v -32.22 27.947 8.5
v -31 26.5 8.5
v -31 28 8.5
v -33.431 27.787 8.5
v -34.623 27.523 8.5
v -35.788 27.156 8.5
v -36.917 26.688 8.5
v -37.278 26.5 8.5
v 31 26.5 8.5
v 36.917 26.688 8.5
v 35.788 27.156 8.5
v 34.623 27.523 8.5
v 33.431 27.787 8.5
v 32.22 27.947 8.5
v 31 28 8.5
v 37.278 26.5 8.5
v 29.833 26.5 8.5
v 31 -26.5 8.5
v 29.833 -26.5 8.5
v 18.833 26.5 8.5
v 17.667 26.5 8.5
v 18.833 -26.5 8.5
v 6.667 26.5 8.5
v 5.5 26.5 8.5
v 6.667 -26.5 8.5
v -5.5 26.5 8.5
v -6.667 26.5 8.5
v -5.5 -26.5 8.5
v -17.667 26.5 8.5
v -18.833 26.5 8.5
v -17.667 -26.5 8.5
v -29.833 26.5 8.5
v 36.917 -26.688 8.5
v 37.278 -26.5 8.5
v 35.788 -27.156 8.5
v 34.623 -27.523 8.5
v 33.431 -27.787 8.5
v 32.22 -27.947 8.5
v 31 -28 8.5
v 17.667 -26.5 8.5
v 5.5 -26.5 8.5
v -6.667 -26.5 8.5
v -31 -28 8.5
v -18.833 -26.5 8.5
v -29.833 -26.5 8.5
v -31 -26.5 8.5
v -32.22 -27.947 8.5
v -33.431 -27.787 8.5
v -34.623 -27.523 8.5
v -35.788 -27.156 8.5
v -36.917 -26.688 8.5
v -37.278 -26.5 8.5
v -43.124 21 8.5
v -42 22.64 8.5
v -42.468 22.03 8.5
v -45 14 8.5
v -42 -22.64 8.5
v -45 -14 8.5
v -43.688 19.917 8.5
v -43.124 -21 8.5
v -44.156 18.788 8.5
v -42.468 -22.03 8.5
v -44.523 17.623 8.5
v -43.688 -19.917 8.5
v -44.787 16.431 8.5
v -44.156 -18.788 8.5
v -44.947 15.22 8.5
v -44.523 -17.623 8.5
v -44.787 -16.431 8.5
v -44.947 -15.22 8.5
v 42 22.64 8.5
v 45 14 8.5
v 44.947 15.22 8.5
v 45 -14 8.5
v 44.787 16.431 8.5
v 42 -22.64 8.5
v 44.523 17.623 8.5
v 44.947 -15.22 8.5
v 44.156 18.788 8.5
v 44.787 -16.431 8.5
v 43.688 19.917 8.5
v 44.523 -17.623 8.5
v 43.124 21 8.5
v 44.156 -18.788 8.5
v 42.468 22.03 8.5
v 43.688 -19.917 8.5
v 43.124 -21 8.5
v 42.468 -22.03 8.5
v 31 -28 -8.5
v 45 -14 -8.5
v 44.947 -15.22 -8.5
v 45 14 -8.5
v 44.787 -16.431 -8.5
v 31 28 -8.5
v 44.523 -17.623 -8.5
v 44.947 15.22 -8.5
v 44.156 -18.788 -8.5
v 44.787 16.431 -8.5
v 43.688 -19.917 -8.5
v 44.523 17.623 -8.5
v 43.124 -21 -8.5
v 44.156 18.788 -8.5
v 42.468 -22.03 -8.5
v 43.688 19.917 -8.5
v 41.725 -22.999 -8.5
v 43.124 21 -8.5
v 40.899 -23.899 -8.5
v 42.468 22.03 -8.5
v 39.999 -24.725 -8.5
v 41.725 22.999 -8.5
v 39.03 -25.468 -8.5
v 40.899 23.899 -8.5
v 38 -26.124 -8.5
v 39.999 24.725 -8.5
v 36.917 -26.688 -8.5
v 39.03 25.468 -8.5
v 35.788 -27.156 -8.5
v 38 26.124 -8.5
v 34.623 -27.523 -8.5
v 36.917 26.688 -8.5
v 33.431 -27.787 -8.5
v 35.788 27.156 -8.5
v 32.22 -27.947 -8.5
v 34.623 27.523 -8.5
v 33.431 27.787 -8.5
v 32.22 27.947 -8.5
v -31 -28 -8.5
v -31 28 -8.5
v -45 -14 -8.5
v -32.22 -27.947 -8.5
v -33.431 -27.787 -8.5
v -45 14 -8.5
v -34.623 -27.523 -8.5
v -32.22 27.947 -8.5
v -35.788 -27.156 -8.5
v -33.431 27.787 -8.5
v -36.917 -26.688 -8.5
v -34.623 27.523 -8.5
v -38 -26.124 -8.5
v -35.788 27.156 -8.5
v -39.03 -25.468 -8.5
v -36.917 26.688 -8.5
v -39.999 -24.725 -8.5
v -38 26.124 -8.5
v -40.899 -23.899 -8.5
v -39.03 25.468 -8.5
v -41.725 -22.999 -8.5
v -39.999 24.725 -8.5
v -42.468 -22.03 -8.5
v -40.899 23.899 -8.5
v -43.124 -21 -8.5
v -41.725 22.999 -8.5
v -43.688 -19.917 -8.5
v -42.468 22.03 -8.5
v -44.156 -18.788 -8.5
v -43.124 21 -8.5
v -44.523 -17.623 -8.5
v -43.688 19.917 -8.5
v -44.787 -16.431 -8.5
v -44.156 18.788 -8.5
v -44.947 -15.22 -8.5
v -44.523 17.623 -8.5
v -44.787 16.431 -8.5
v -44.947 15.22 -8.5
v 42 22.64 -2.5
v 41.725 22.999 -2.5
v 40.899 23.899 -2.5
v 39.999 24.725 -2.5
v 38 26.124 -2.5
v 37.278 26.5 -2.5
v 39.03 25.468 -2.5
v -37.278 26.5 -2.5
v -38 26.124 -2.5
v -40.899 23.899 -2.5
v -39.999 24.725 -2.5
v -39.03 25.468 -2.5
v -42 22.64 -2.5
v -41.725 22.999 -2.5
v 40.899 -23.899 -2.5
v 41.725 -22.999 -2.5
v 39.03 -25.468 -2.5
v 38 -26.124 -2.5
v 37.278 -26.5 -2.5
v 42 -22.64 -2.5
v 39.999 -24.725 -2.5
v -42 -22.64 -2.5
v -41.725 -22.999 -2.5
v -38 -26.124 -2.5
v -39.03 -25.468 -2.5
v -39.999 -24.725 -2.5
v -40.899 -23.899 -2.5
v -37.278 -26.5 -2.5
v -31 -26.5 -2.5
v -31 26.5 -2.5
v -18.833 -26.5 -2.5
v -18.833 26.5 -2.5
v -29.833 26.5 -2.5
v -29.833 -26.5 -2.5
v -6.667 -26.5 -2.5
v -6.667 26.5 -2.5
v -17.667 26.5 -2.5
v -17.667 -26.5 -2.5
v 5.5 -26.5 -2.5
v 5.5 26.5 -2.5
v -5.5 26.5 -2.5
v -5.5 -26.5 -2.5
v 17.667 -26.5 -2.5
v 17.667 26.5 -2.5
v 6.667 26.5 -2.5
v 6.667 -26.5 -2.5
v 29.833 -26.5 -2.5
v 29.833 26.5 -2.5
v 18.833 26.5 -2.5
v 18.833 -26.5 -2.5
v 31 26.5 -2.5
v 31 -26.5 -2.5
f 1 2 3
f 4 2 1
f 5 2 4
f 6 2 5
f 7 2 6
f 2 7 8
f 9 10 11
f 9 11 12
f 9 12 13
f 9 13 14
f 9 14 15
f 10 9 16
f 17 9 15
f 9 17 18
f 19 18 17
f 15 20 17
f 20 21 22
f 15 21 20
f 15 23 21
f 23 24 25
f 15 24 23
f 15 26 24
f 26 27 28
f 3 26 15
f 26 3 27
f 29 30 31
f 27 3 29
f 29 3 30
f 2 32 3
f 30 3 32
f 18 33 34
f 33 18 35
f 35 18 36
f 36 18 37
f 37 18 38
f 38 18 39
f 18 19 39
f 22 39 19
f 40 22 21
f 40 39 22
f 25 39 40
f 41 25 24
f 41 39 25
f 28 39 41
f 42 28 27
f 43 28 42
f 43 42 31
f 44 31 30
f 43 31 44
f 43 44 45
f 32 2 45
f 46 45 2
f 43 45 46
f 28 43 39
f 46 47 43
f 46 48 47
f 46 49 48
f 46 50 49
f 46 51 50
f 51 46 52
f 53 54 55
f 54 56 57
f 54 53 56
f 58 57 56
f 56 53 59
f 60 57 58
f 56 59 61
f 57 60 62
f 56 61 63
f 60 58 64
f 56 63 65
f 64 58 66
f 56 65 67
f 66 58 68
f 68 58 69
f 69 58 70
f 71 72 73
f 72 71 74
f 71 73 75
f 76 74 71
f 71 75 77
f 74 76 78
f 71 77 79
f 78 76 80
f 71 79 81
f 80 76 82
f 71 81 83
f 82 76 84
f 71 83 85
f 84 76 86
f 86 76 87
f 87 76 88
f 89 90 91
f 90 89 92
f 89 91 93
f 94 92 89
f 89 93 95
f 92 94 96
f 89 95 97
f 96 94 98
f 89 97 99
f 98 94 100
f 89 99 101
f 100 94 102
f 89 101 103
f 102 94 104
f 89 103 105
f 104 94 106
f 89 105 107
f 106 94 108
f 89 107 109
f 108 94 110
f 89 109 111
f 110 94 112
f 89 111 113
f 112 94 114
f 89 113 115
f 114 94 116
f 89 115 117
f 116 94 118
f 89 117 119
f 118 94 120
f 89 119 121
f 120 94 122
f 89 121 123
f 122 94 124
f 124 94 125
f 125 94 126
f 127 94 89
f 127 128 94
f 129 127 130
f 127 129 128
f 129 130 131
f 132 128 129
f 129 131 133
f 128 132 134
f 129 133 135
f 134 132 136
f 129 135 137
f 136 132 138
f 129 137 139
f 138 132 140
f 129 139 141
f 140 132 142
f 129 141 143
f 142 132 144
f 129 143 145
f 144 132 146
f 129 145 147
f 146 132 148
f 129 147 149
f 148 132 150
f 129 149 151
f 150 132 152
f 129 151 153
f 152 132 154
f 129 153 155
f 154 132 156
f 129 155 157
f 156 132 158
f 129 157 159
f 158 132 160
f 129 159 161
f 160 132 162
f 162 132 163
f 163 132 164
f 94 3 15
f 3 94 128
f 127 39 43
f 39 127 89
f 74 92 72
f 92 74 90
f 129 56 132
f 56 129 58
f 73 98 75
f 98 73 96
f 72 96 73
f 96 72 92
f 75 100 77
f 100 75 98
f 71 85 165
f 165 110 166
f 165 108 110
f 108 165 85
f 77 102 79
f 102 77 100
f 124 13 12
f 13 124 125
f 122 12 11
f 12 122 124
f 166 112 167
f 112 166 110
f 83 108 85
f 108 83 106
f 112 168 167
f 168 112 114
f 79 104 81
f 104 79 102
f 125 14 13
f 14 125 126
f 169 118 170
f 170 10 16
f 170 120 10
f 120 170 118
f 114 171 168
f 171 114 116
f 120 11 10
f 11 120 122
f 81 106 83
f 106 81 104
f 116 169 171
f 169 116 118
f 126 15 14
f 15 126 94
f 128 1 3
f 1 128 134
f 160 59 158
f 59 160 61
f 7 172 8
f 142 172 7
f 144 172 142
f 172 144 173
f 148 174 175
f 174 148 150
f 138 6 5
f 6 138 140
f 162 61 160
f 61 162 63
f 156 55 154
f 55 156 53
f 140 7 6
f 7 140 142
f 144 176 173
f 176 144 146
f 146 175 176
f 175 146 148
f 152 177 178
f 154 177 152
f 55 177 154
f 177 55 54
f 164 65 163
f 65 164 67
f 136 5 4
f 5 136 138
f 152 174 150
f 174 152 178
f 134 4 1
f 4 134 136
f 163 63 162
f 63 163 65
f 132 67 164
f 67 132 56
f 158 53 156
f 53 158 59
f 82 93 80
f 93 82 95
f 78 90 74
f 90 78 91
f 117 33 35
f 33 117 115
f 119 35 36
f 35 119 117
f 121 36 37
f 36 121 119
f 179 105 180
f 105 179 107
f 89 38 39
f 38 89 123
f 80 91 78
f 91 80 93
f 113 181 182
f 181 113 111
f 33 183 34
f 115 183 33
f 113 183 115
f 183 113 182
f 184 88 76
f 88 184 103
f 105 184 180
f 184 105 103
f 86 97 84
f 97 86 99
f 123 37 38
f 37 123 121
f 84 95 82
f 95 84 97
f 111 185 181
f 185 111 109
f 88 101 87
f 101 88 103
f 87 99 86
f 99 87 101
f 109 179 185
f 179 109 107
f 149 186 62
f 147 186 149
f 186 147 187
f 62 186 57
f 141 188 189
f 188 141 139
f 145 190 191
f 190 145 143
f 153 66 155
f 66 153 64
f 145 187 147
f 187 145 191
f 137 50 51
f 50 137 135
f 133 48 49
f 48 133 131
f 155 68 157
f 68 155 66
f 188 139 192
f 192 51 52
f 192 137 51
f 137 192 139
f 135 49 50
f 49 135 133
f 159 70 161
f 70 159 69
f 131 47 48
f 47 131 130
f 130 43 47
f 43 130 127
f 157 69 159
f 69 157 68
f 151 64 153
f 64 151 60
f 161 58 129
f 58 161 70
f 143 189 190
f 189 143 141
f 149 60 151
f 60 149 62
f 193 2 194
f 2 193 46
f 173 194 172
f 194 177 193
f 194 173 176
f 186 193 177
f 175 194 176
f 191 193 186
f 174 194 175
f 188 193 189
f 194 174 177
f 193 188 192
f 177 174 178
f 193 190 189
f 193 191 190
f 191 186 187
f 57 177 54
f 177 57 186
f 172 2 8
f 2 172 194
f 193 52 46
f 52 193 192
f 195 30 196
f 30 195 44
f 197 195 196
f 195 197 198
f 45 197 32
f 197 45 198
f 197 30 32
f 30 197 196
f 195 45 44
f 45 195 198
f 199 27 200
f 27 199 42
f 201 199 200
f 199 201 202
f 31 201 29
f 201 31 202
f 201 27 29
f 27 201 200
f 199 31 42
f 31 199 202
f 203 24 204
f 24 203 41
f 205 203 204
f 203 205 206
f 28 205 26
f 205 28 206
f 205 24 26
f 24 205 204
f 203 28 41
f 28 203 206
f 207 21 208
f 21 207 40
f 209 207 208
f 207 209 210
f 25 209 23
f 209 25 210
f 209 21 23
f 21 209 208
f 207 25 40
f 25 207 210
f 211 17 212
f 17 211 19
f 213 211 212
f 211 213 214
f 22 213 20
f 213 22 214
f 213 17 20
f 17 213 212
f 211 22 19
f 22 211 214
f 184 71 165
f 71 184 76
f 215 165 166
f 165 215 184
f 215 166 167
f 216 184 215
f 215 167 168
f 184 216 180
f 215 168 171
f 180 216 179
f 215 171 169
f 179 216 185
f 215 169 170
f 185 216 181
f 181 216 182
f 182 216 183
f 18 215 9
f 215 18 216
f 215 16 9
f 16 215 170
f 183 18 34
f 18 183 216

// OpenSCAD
// Altoid tin base inner dimensions
tinx = 90;
tiny = 56;
tinz = 17;
tincorner = 14;

// refill cartridge dimensions
cartlen = 53;
cartd   = 11;

count = 7;

// Size of outer wall
outerwall = 3;

// Size of the wall between cartridges
//sepwall = (tinx - (2*outerwall) - (count*cartd))/(count - 1);

line = tinx - ((2*outerwall) + cartd);
step = line/(count-1);

$fn = 72;

module tin() {
    cube([tinx - (2*tincorner), tiny, tinz], center=true);
    cube([tinx, tiny - (2*tincorner), tinz], center=true);
    translate([(tinx-(2*tincorner))/2, (tiny-(2*tincorner))/2, 0]){
        cylinder(h=tinz, r=tincorner, center=true);
    }
    translate([-(tinx-(2*tincorner))/2, (tiny-(2*tincorner))/2, 0]){
        cylinder(h=tinz, r=tincorner, center=true);
    }
    translate([(tinx-(2*tincorner))/2, -(tiny-(2*tincorner))/2, 0]){
        cylinder(h=tinz, r=tincorner, center=true);
    }
    translate([-(tinx-(tincorner*2))/2, -(tiny-(tincorner*2))/2, 0]){
        cylinder(h=tinz, r=tincorner, center=true);
    }
}

module cartridge() {
    cube([cartd, cartlen, cartd], center=true);
}

difference() {
    tin();
    
    pos = -line/2;
    for(i = [0:(count-1)])
        translate([(pos + i*step), 0, (tinz - cartd)/2]){
            cartridge();
        }
}
